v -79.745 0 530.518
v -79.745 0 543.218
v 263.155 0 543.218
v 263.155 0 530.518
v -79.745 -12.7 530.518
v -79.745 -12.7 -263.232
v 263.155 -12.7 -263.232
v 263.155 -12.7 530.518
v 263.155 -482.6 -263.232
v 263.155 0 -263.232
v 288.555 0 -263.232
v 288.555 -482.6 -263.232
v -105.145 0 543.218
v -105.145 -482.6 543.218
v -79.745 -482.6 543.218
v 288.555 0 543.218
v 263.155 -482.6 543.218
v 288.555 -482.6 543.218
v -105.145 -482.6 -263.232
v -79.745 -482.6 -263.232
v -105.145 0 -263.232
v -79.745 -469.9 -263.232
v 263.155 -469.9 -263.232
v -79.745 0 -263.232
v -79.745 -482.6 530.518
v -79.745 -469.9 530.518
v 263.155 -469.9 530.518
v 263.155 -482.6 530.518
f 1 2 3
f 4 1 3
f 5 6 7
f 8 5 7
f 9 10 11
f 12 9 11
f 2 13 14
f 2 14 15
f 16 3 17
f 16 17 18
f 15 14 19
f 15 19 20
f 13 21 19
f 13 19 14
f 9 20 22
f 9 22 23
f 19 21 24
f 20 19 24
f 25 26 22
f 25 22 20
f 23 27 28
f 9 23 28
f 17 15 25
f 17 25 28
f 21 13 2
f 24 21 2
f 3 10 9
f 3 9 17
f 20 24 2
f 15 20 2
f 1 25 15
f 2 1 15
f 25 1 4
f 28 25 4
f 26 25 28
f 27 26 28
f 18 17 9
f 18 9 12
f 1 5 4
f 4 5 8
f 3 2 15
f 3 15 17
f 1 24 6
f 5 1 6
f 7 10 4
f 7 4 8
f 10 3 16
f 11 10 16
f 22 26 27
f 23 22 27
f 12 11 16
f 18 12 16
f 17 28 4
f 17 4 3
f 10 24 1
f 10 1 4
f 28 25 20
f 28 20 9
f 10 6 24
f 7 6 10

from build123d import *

# Parameters (mm, degrees)
F1_W     = 25.4
F1_H     = 806.45
F2_DEPTH = 482.6
F3_W     = 342.9
F3_H     = 12.7
F4_DEPTH = 482.6
F5_W     = 342.9
F5_H     = 12.7
F6_DEPTH = 793.75
F7_W     = 342.9
F7_H     = 12.7
F8_DEPTH = 793.75


# Not quite as in the source:
# - a feature of the source that left no trace in its solid (it failed there, or was rolled back) is left out


with BuildPart() as f2:
    # F1 (on face) → F2 (new body)
    with BuildSketch(Plane.XZ):
        with Locations((-92.4449153244, 139.9926033994)):
            Rectangle(F1_W, F1_H)
    extrude(amount=F2_DEPTH)


with BuildPart() as f2b:
    # F1 (on face) → F2, piece 2 (new body)
    with BuildSketch(Plane.XZ):
        with Locations((275.8550846756, 139.9926033994)):
            Rectangle(F1_W, F1_H)
    extrude(amount=F2_DEPTH)


with BuildPart() as f4:
    # F3 (on face) → F4 (new body, through all)
    with BuildSketch(Plane.XZ.offset(482.6)):
        with Locations((91.7050846756, 536.8676033994)):
            Rectangle(F3_W, F3_H)
    extrude(amount=-F4_DEPTH)


with BuildPart() as f6:
    # F5 (on face) → F6 (new body, through all)
    with BuildSketch(Plane(origin=(0, 0, -263.2323966006), x_dir=(1, 0, 0), z_dir=(0, 0, -1))):
        with Locations((91.7050846756, 6.35)):
            Rectangle(F5_W, F5_H)
    extrude(amount=-F6_DEPTH)


with BuildPart() as f8:
    # F7 (on face) → F8 (new body, through all)
    with BuildSketch(Plane(origin=(0, 0, 530.5176033994), x_dir=(1, 0, 0), z_dir=(0, 0, -1))):
        with Locations((91.7050846756, 476.25)):
            Rectangle(F7_W, F7_H)
    extrude(amount=F8_DEPTH)


solid = Compound([f2.part, f2b.part, f4.part, f6.part, f8.part])
